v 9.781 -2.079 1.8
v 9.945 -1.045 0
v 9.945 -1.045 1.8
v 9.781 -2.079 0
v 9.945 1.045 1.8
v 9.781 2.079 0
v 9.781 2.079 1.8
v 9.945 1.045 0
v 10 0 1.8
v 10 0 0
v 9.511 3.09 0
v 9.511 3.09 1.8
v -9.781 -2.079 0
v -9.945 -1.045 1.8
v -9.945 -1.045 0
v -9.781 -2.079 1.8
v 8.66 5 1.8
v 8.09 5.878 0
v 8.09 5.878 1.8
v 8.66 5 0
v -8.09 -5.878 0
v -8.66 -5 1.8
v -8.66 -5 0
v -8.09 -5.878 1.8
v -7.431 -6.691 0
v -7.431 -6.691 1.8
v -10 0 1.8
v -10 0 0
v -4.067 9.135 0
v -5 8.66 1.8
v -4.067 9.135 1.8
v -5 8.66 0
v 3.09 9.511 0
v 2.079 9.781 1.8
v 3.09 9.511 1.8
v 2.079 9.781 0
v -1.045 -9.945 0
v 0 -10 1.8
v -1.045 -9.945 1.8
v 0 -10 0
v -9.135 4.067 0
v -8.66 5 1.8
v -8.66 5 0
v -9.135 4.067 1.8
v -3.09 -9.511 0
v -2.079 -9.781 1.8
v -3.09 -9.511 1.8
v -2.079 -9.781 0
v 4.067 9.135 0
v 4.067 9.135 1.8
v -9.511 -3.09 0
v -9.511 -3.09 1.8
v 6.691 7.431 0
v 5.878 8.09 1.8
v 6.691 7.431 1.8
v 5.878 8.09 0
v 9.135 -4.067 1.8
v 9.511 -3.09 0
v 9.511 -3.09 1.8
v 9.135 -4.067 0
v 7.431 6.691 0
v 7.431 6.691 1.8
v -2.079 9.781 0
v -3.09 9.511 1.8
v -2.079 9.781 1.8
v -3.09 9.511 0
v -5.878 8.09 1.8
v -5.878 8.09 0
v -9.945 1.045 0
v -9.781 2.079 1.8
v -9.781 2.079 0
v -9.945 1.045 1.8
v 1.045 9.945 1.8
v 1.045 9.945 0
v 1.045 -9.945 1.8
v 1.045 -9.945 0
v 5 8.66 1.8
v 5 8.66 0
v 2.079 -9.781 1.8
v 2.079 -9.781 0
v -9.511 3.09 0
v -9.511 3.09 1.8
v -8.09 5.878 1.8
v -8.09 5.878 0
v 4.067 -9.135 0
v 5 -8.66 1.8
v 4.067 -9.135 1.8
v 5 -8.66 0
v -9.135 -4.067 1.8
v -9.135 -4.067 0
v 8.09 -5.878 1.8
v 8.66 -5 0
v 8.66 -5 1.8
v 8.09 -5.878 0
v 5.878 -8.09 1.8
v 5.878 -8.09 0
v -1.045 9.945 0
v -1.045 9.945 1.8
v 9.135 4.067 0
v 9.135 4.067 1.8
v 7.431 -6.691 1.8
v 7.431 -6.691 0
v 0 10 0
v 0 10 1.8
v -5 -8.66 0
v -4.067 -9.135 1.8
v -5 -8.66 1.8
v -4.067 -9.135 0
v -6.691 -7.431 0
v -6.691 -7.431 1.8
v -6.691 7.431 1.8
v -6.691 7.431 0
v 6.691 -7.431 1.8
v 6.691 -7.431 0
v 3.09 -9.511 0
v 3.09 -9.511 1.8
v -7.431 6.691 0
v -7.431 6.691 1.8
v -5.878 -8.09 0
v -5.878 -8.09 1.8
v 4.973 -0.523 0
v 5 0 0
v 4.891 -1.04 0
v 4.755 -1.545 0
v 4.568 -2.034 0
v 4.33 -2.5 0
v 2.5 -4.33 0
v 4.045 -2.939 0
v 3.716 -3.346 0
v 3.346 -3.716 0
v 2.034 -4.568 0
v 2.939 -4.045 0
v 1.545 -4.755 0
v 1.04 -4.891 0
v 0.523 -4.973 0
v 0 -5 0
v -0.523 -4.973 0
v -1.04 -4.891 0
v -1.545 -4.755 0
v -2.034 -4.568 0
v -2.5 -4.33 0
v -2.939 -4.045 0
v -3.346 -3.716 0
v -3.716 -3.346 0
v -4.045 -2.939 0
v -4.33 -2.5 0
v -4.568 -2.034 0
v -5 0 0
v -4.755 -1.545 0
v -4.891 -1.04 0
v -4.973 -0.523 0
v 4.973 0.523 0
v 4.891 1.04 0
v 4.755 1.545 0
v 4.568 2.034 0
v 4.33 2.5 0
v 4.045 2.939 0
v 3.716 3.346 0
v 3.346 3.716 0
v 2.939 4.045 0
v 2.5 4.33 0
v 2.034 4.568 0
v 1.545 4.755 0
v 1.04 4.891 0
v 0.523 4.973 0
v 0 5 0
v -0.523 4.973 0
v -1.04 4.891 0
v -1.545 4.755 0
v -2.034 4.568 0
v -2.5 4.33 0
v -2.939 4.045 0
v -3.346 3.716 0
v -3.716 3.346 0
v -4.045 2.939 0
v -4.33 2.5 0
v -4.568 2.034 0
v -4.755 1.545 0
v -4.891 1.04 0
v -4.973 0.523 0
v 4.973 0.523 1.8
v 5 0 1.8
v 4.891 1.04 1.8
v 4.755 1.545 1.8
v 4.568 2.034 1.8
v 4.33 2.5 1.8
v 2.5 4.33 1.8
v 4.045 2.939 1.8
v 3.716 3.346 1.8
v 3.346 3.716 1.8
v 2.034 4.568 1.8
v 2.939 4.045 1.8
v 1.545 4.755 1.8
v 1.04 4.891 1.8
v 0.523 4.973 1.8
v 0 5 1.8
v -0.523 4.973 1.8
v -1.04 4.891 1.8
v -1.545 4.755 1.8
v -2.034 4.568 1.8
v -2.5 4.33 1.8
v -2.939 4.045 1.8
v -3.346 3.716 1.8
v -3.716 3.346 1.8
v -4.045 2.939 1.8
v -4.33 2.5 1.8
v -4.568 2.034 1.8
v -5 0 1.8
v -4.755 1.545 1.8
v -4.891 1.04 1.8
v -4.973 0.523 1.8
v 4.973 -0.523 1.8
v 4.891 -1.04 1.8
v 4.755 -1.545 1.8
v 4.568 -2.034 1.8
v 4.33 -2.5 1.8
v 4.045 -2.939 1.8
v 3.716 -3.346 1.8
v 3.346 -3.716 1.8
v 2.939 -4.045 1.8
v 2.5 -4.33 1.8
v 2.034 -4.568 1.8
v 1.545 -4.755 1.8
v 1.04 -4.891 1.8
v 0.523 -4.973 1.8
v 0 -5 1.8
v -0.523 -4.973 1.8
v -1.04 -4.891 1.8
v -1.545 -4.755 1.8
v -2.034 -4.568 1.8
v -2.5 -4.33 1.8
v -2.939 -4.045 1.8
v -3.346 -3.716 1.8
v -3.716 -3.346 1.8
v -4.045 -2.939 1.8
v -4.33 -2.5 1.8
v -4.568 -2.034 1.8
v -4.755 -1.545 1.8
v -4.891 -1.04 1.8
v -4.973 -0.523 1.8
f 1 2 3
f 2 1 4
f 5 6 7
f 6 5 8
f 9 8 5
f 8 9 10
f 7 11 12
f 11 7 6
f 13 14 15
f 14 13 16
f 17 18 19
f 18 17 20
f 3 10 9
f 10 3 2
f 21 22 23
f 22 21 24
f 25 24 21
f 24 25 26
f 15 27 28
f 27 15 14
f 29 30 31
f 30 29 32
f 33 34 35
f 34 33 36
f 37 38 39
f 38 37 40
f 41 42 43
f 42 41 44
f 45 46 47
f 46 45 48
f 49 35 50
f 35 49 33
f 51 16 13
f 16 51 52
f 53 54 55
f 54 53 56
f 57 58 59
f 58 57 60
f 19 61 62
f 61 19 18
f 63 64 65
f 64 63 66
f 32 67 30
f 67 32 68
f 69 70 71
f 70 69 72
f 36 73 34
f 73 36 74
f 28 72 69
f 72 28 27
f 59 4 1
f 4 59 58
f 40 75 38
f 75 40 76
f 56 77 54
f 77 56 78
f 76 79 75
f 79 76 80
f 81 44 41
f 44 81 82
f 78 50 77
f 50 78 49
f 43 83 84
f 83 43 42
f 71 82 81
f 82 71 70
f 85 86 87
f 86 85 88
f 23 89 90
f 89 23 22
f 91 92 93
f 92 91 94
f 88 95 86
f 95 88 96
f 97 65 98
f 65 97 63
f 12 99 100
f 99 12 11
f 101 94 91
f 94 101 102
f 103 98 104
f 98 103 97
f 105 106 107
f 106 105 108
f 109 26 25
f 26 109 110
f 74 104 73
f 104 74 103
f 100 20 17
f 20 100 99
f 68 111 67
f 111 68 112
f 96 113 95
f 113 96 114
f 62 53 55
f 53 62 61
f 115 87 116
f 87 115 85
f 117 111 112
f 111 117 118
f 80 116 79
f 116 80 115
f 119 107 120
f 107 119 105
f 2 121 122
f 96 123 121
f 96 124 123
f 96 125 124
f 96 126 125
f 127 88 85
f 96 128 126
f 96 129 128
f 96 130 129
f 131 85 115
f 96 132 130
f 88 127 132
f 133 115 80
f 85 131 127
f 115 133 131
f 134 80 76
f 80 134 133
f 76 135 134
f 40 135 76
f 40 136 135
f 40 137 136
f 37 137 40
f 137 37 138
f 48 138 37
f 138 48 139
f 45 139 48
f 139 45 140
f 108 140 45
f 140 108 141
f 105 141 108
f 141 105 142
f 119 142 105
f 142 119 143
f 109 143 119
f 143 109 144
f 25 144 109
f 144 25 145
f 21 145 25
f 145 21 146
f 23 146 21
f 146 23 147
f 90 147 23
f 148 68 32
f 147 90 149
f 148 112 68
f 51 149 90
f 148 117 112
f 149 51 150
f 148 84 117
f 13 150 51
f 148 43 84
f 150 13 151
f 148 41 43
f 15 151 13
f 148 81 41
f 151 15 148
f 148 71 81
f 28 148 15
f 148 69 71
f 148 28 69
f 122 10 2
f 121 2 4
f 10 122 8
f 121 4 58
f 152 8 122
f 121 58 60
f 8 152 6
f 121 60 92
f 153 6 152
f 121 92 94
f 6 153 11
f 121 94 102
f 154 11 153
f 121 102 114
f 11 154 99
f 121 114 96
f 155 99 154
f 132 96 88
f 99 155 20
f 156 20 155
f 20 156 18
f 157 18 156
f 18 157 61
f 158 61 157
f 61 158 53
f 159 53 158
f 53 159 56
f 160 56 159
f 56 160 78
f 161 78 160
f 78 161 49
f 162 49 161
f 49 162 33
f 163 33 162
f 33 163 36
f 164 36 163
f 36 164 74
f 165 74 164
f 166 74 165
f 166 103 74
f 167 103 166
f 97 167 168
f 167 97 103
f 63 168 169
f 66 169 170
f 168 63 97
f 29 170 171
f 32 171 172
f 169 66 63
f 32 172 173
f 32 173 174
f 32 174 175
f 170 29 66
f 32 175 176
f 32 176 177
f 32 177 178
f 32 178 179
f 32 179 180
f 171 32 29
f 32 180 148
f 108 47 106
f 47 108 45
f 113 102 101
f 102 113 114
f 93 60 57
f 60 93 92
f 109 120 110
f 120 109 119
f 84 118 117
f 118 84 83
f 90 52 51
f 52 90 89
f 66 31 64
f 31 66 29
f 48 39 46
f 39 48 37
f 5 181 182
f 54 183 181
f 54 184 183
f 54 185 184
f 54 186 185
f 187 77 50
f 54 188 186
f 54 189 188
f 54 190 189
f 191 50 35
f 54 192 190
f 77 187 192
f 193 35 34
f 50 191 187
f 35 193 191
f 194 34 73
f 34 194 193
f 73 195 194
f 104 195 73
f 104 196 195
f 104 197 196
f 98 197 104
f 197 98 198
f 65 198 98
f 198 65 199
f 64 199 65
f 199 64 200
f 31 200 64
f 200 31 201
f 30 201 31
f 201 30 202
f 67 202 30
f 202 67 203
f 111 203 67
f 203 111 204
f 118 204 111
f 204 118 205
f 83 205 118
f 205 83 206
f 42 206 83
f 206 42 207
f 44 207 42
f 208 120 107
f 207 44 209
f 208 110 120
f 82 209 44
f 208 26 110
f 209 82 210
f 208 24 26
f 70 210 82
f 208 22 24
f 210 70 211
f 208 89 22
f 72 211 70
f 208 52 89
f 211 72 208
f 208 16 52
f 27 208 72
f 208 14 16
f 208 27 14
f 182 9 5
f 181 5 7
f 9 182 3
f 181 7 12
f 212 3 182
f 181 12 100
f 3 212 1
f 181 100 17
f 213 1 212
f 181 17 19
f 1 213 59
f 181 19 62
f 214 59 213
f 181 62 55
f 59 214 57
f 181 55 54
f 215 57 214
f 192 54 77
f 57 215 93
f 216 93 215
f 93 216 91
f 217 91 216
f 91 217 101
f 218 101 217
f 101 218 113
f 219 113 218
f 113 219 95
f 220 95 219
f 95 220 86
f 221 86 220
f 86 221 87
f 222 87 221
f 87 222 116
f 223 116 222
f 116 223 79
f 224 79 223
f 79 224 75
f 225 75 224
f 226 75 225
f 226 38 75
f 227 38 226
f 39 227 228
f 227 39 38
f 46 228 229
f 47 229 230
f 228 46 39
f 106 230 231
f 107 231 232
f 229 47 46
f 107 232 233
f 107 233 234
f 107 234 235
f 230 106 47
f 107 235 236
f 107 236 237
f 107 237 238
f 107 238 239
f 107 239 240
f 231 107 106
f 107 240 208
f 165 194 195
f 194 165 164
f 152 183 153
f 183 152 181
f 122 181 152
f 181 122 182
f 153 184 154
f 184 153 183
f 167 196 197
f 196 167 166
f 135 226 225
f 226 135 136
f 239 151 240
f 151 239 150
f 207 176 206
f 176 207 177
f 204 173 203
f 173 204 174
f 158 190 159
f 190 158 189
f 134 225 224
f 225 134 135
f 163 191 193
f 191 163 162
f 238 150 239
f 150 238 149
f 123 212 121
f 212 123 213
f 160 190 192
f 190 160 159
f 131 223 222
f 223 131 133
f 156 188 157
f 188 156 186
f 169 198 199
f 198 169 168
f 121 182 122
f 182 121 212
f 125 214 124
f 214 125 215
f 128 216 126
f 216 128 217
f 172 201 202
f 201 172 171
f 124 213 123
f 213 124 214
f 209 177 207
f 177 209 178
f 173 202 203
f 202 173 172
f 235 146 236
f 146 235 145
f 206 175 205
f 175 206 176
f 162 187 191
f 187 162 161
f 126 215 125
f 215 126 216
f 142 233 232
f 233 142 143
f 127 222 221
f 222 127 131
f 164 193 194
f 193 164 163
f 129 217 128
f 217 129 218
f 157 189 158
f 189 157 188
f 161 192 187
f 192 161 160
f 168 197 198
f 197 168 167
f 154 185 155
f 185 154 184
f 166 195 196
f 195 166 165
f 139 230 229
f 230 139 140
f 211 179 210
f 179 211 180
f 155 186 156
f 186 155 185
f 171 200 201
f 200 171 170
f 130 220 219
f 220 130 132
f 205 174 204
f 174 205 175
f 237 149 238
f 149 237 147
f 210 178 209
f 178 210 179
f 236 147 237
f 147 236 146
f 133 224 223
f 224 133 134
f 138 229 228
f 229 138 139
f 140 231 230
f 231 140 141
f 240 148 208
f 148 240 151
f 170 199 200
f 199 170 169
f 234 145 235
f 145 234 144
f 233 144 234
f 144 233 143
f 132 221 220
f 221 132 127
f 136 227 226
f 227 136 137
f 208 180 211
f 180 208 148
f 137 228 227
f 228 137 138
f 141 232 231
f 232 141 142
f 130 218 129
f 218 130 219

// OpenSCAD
$fn = 60;
difference() {
    cylinder(1.8, 10, 10);
    translate([0, 0, -1]) cylinder(6, 5, 5);
}
